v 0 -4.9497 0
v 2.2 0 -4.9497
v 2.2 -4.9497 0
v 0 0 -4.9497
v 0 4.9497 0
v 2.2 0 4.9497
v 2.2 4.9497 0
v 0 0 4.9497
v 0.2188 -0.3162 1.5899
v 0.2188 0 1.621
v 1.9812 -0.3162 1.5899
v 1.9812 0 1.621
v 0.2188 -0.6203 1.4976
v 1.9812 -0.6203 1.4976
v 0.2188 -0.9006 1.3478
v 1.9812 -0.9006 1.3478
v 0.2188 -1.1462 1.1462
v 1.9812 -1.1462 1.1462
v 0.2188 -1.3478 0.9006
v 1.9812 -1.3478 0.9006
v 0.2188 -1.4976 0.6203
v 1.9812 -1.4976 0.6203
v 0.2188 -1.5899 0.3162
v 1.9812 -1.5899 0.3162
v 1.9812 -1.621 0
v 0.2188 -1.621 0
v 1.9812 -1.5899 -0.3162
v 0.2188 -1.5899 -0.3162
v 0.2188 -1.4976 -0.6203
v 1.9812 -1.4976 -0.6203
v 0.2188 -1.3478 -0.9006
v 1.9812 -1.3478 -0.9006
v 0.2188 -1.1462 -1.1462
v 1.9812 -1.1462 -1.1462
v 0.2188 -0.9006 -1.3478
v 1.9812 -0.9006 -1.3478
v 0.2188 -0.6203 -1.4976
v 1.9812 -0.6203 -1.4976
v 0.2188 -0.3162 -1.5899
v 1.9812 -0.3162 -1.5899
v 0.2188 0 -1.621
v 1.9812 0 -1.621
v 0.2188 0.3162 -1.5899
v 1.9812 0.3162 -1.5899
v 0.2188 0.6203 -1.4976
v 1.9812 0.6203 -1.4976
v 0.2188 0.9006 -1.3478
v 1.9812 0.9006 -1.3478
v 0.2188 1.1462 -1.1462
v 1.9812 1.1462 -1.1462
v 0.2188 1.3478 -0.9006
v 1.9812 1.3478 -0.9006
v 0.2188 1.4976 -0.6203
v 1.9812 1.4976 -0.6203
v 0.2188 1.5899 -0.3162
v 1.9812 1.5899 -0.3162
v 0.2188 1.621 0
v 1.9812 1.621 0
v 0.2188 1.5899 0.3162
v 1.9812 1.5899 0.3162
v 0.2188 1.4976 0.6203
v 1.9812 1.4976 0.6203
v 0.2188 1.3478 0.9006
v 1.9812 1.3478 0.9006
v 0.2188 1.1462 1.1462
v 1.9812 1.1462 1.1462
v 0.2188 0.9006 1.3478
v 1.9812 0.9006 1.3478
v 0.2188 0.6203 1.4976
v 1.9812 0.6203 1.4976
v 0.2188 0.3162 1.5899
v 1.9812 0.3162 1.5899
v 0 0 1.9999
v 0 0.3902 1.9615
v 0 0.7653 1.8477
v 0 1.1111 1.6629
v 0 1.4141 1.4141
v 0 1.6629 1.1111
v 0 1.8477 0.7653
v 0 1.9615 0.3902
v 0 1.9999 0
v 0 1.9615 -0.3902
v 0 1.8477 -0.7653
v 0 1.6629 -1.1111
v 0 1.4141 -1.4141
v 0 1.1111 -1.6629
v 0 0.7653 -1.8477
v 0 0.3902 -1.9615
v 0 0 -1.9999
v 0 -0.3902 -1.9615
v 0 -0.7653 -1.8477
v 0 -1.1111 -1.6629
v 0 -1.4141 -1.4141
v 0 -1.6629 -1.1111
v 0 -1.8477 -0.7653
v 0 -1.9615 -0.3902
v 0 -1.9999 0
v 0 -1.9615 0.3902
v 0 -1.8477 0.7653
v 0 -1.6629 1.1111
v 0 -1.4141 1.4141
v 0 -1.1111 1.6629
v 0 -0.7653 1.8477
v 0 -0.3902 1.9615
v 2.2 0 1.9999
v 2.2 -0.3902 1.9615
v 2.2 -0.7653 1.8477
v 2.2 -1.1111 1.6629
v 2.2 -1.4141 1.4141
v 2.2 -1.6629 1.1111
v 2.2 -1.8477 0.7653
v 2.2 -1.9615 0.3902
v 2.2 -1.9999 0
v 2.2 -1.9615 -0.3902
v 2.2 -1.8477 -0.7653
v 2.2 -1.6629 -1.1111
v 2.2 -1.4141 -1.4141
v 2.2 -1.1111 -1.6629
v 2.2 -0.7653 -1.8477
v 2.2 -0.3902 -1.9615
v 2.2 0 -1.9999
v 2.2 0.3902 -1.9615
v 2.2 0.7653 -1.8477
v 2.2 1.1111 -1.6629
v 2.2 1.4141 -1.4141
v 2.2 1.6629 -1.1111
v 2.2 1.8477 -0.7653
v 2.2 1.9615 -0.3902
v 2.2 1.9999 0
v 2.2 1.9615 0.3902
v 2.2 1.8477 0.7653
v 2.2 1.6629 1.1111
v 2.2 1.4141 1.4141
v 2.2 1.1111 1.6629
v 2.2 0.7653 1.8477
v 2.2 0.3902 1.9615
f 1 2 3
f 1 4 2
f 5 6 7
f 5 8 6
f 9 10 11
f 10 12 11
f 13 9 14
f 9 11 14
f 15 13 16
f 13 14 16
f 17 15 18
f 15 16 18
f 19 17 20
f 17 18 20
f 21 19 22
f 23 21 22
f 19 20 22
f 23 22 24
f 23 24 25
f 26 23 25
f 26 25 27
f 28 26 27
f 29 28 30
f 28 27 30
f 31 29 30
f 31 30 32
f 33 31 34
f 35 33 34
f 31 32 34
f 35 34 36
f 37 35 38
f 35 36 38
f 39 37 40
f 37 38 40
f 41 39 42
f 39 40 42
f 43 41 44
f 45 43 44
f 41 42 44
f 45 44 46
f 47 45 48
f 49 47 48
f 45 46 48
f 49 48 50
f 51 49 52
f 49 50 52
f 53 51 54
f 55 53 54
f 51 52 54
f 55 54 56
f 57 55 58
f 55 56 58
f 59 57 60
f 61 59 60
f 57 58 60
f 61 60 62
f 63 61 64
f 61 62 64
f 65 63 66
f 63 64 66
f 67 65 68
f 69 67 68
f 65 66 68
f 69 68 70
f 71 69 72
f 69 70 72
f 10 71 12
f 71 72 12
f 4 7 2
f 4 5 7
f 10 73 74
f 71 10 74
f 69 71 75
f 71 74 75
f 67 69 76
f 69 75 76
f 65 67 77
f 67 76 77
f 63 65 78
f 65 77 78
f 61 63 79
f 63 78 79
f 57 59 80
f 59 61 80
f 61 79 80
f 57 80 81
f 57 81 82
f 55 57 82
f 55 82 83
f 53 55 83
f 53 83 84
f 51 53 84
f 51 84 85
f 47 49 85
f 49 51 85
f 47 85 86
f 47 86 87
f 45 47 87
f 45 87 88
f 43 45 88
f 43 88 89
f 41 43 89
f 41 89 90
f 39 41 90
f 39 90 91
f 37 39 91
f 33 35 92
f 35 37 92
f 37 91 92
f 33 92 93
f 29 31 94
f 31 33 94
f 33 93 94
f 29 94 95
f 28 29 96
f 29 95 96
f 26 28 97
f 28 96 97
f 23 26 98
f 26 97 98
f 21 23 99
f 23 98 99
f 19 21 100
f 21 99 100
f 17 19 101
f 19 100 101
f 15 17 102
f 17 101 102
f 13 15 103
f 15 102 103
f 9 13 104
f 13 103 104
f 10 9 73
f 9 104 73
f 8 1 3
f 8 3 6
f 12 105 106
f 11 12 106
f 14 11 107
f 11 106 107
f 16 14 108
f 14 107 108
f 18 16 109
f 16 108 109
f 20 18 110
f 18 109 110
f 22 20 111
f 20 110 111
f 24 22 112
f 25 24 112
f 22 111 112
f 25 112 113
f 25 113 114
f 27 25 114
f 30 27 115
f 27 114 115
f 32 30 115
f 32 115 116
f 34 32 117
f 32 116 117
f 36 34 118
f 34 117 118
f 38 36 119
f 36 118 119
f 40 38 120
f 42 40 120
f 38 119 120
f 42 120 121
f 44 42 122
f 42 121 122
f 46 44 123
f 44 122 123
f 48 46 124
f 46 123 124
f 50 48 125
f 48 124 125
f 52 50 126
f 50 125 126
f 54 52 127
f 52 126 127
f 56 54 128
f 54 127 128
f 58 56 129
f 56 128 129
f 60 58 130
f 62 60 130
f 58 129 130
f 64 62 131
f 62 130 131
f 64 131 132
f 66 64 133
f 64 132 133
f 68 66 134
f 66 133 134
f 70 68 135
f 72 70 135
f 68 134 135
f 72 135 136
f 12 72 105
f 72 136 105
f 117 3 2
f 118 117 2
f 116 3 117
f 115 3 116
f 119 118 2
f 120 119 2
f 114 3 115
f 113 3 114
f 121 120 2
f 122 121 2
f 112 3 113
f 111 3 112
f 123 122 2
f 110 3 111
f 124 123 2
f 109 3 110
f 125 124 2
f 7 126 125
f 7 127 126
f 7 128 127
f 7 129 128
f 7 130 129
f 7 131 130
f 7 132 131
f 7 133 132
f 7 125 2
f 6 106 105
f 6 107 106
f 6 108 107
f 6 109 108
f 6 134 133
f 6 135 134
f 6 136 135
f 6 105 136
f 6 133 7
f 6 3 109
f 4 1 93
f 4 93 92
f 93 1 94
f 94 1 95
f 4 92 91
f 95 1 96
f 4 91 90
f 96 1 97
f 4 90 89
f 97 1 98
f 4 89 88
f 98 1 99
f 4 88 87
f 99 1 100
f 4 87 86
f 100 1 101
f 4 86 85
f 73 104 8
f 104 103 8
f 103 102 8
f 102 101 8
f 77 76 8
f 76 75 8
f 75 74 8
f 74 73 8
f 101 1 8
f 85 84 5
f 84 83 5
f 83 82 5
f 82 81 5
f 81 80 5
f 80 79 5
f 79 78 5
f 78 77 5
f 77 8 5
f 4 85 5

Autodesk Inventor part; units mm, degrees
ref_plane "YZ Plane" through (0, 0, 0) normal (1, 0, 0) x (0, 1, 0)
ref_plane "XZ Plane" through (0, 0, 0) normal (0, 1, 0) x (-1, 0, 0)
sketch "Skizze1" plane through (0, 0, 0) normal (1, 0, 0) x (0, 1, 0)
  line L0 (0, -4.9497) -> (-4.9497, 0)
  line L1 (-4.9497, 0) -> (0, 4.9497)
  line L2 (0, 4.9497) -> (4.9497, 0)
  line L3 (4.9497, 0) -> (0, -4.9497)
  line L4 (-6.9296, 0) -> (6.9296, 0) projected
  point P0 (0, 0)
  point P1 (0, 0)
  dimension "d0" = 9.8995
extrude "Körper" add sketch "Skizze1" along normal blind 2.2
sketch "Skizze2" plane through (0, 0, 0) normal (-1, 0, 0) x (0, 0, 1)
  point P0 (0, 0)
  point P1 (0, 0)
hole "Gewinde" at (0, 0, 0) direction (1, 0, 0) diameter 3.242 end through all thread size "M4x0.7" class "6H" standard "ISO Metric profile"
chamfer "Fase1" distance 0.3789 angle 30 1 edges at (0, 0, -1.621) measured on face at (0, -2.0082, 2.0544)
chamfer "Fase2" distance 0.3789 angle 30 1 edges at (2.2, 0, -1.621) measured on face at (2.2, -2.0082, 2.0544)
ref_plane "Work Plane1" through (14.1718, 0, 0) normal (0, 0.7071, -0.7071) x (-1, 0, 0)
equation "\"d0\" = 1.41421 * SW"
equation "\"d1\" = KOH"
equation "\"d3\" = -0.5 * GD1 + 0.5 * NND"
equation "\"d35\" = -0.5 * GD1 + 0.5 * NND"
equation "\"d5\" = -0.5 * GD1 + 0.5 * NND"
equation "\"d36\" = -0.5 * GD1 + 0.5 * NND"
equation "\"NND\" = 4"
equation "\"KOH\" = 2.2"
equation "\"SW\" = 7"
equation "\"GUL\" = 0.541266 * PTC"
equation "\"THREADDIA\" = 4"
equation "\"TOA\" = 30deg"
equation "\"PTC\" = 0.7"
equation "\"E0\" = 8.9"
equation "\"GAL\" = 0.541266 * PTC"
equation "\"GD1\" = 3.242228"
properties part number "DIN 562 - M4" material "Stahl, weich"
